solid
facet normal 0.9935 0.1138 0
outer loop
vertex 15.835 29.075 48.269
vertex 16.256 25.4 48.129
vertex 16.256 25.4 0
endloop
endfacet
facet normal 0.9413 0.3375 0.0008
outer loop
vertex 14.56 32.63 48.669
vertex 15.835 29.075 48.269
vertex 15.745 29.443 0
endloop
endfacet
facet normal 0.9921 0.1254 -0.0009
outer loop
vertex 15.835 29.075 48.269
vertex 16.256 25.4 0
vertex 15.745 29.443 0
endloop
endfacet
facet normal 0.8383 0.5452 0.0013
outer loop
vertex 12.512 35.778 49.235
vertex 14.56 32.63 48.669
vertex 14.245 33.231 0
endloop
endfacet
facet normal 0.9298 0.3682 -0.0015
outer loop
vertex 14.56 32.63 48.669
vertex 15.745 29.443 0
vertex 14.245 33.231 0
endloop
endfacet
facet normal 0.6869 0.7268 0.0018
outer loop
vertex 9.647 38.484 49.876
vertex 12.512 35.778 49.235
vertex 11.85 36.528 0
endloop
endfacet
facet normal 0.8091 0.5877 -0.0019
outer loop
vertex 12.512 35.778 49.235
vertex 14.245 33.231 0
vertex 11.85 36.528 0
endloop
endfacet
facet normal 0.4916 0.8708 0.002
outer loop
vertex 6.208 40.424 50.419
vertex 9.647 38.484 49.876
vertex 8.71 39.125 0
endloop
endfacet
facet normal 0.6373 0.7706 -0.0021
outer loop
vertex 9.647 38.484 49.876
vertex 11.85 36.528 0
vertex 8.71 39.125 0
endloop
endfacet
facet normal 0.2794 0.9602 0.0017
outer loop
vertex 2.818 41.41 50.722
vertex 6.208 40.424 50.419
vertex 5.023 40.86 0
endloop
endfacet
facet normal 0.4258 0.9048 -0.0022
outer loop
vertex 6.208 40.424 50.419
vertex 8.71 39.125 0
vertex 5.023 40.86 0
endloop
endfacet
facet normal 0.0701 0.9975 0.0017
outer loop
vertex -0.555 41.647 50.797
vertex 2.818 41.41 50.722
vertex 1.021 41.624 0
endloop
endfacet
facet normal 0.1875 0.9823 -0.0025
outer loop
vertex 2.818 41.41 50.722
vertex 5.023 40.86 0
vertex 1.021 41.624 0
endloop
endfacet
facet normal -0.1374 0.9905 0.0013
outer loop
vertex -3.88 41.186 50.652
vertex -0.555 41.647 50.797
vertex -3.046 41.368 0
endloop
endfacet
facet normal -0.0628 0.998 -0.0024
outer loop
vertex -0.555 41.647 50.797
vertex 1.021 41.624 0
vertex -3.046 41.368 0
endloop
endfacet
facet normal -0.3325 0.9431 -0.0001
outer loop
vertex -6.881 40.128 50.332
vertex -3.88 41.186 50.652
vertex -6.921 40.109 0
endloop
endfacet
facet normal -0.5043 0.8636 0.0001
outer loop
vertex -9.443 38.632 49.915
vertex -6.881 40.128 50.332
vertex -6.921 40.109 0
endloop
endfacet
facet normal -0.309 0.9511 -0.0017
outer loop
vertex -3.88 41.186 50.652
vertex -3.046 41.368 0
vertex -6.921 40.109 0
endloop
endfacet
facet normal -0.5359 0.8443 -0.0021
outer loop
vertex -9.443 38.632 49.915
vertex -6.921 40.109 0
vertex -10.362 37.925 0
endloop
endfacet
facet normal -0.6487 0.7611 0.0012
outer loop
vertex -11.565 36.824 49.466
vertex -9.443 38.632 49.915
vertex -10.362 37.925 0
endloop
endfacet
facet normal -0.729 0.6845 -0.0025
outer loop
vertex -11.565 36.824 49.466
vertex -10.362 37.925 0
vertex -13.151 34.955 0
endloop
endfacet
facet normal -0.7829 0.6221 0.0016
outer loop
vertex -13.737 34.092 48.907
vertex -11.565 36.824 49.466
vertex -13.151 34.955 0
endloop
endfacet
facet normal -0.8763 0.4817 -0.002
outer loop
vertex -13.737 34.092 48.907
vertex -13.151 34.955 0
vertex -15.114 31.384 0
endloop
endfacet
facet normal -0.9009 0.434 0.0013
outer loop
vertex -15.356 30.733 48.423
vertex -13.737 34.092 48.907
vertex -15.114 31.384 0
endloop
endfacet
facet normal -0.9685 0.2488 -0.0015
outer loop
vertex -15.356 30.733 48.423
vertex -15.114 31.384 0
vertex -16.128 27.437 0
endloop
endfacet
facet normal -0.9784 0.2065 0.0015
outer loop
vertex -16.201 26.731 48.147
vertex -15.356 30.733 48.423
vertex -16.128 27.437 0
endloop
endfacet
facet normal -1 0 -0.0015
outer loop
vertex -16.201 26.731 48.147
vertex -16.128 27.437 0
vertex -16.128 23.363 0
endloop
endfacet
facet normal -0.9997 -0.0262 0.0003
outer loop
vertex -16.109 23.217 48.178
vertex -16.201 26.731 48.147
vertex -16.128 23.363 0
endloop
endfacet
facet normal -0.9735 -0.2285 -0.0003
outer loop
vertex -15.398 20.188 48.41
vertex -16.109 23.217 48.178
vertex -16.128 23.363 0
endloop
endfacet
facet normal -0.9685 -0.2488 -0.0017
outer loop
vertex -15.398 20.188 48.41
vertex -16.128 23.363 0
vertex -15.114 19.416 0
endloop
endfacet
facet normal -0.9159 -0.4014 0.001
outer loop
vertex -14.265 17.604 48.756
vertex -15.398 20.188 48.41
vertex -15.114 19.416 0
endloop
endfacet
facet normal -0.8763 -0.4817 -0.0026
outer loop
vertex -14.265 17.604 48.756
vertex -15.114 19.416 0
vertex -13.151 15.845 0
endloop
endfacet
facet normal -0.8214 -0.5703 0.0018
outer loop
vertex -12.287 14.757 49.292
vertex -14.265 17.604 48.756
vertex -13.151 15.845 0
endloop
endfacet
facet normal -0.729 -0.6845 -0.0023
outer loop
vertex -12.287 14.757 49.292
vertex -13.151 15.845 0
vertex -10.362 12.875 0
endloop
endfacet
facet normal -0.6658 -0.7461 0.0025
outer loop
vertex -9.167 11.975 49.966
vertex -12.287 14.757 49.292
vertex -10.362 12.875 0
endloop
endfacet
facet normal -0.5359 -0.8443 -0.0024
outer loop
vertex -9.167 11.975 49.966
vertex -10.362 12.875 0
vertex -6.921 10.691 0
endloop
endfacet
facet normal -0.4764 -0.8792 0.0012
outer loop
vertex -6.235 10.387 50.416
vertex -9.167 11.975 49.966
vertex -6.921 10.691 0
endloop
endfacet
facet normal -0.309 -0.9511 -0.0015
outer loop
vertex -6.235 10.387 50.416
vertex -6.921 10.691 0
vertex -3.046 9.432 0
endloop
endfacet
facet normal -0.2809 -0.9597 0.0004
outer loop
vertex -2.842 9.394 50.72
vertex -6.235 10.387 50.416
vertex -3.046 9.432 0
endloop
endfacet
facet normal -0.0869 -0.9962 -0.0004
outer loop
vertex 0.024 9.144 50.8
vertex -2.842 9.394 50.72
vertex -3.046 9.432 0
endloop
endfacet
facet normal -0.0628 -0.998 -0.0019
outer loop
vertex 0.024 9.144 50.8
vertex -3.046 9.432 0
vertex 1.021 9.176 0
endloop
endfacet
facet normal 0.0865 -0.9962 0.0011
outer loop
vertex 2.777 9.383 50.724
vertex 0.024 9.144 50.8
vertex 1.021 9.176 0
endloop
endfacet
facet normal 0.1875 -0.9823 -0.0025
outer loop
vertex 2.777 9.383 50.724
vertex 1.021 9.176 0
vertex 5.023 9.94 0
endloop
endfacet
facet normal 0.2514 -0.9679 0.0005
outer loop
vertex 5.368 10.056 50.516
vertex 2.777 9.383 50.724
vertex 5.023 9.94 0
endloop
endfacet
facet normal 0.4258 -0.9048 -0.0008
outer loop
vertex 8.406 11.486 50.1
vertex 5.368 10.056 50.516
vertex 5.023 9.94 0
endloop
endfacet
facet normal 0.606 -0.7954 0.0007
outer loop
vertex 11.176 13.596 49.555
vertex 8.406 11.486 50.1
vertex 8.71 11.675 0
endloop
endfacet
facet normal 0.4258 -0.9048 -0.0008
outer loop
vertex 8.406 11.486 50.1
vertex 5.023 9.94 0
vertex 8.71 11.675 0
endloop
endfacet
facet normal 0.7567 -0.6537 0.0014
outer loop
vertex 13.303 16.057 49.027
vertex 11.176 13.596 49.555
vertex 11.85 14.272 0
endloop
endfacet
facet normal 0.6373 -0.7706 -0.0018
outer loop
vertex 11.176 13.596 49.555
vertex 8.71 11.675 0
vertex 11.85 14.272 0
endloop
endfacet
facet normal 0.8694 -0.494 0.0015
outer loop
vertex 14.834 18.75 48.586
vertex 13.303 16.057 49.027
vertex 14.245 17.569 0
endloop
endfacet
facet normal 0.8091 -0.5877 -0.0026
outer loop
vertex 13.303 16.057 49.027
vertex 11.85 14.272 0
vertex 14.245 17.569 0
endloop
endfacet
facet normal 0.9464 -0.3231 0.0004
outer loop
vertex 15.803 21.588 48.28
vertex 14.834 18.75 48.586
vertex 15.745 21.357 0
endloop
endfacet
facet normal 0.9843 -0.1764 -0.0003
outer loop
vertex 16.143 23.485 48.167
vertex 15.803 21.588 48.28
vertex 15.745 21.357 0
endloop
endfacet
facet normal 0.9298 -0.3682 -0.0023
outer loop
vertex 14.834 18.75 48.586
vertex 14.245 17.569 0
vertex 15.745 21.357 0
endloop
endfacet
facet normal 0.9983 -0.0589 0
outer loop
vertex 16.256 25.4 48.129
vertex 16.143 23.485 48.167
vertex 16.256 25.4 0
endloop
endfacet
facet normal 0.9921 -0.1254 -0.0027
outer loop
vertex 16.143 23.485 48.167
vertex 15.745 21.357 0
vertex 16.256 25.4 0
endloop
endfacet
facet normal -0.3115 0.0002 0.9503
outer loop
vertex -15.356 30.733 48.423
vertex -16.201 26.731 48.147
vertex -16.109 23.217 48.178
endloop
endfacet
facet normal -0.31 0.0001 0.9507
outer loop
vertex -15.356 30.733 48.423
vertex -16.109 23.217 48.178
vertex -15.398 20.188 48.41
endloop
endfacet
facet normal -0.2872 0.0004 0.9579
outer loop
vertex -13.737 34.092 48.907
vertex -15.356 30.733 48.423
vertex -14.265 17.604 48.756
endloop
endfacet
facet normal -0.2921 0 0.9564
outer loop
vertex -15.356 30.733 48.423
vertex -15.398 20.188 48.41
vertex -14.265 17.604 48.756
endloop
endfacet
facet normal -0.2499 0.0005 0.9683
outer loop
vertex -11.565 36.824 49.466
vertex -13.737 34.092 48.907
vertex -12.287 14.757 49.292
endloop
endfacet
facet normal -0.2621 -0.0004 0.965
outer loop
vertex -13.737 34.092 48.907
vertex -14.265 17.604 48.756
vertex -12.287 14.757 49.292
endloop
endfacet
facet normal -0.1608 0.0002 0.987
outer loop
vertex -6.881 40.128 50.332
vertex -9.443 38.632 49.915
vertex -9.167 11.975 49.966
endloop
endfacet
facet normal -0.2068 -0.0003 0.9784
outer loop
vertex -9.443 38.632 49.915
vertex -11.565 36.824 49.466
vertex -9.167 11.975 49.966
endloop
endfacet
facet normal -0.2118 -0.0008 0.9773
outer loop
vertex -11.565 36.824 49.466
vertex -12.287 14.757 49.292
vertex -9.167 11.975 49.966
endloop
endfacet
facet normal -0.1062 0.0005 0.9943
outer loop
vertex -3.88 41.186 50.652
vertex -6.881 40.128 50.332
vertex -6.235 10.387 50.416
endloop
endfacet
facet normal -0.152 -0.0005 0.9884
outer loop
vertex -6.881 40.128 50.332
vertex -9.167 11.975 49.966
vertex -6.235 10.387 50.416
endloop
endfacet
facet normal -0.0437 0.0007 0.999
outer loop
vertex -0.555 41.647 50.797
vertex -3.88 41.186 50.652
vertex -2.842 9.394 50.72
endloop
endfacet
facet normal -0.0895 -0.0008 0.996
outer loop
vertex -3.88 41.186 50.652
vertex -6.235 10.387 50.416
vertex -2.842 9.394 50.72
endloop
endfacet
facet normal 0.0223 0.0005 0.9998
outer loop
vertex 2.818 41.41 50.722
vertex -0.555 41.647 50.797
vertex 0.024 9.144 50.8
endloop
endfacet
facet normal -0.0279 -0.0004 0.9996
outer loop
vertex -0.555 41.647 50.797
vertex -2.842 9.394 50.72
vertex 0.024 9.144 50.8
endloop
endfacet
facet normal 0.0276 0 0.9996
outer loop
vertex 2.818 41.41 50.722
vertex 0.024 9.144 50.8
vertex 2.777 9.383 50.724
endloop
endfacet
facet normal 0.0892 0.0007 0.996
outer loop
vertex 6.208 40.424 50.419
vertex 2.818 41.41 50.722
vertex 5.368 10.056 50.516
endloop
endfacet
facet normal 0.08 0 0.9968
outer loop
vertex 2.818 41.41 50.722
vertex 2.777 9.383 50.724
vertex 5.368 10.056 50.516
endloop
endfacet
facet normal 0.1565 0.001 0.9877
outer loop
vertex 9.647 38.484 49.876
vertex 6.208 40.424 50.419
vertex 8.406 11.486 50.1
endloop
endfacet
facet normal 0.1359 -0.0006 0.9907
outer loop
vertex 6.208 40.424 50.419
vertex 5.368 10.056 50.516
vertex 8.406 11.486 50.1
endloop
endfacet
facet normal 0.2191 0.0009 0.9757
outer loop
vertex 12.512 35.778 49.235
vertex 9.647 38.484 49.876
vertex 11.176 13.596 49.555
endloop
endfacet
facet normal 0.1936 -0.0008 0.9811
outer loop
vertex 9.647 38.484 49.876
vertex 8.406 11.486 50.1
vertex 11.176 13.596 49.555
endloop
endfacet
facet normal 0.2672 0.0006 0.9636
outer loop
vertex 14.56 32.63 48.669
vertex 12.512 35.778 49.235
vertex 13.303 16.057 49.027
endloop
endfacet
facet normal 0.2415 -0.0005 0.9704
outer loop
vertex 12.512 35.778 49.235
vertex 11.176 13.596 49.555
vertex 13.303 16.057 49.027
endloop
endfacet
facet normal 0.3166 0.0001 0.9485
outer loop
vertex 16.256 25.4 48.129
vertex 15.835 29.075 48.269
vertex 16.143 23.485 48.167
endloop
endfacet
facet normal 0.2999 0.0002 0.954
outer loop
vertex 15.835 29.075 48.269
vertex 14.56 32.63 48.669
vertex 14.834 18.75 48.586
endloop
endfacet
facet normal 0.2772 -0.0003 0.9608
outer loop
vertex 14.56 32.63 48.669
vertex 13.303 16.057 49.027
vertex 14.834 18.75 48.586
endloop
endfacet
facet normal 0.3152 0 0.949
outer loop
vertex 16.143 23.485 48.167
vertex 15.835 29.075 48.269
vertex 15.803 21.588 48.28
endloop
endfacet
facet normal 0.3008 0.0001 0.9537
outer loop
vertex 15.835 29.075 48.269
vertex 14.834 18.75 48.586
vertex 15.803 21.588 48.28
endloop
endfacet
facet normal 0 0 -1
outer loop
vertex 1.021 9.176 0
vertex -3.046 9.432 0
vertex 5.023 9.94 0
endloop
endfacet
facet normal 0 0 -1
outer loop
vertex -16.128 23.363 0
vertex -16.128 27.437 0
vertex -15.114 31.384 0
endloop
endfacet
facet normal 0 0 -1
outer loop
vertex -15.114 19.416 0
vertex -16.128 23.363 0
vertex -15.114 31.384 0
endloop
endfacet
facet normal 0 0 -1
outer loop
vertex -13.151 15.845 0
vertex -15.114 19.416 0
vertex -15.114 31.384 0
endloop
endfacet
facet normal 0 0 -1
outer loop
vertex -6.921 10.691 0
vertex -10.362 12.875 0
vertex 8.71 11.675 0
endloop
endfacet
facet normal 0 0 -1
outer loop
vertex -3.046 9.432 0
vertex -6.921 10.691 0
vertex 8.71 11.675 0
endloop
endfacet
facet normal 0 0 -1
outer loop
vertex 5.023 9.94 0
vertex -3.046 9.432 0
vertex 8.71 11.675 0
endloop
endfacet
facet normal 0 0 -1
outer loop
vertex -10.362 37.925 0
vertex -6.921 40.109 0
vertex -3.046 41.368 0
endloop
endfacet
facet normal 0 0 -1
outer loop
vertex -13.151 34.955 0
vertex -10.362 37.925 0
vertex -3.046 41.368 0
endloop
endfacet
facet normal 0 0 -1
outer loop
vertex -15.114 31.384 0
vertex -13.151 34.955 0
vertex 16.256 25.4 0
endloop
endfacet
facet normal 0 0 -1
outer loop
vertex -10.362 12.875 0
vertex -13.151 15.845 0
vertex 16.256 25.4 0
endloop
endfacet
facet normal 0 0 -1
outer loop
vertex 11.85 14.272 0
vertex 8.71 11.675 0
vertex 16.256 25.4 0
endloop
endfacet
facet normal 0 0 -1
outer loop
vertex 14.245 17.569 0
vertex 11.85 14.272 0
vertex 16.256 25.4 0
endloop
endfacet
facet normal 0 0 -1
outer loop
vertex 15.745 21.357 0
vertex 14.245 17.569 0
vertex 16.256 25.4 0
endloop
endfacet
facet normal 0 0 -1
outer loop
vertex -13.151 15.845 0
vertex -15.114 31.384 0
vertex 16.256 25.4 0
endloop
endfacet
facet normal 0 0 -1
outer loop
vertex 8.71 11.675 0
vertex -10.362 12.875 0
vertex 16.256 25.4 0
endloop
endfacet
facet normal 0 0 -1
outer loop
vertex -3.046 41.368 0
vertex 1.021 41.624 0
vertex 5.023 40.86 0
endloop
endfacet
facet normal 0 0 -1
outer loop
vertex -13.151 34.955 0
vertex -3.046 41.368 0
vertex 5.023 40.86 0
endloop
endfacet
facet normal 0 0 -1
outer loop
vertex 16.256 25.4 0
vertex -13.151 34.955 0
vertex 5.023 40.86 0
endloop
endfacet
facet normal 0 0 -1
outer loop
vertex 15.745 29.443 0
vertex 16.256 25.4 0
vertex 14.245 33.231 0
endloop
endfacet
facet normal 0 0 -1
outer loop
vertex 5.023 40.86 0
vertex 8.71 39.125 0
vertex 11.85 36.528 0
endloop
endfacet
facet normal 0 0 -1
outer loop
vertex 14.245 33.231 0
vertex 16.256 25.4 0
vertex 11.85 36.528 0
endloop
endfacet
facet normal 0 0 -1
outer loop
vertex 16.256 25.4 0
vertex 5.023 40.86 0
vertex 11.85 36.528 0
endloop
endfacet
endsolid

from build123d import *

# Parameters (mm, degrees)
SKETCH1_R               = 50.8
BOSS_EXTRUDE1_DEPTH     = 50.8
SKETCH2_W               = 101.6
SKETCH2_H               = 50.8
SKETCH2_R               = 16.256
CUT_EXTRUDE1_DEPTH      = 51.8
CUT_EXTRUDE1_DEPTH_BACK = 51.8
SKETCH3_R               = 16.256
CUT_EXTRUDE2_DEPTH      = 50.8


with BuildPart() as part:
    # Sketch1 → Boss-Extrude1 (new body)
    with BuildSketch(Plane(origin=(0, 0, 0), x_dir=(1, 0, 0), z_dir=(0, 1, 0))):
        Circle(SKETCH1_R)
    extrude(amount=BOSS_EXTRUDE1_DEPTH)

    # Sketch2 → Cut-Extrude1 (cut, two sides)
    with BuildSketch(Plane.XY) as cut_extrude1_sk:
        with Locations((0, 25.4)):
            Rectangle(SKETCH2_W, SKETCH2_H)
        with Locations((0, 25.4)):
            Circle(SKETCH2_R, mode=Mode.SUBTRACT)
    extrude(amount=CUT_EXTRUDE1_DEPTH, mode=Mode.SUBTRACT)
    extrude(cut_extrude1_sk.sketch, amount=-CUT_EXTRUDE1_DEPTH_BACK, mode=Mode.SUBTRACT)

    # Sketch3 → Cut-Extrude2 (cut)
    with BuildSketch(Plane.XY):
        with Locations((0, 25.4)):
            Circle(SKETCH3_R)
    extrude(amount=-CUT_EXTRUDE2_DEPTH, mode=Mode.SUBTRACT)


solid = part.part
